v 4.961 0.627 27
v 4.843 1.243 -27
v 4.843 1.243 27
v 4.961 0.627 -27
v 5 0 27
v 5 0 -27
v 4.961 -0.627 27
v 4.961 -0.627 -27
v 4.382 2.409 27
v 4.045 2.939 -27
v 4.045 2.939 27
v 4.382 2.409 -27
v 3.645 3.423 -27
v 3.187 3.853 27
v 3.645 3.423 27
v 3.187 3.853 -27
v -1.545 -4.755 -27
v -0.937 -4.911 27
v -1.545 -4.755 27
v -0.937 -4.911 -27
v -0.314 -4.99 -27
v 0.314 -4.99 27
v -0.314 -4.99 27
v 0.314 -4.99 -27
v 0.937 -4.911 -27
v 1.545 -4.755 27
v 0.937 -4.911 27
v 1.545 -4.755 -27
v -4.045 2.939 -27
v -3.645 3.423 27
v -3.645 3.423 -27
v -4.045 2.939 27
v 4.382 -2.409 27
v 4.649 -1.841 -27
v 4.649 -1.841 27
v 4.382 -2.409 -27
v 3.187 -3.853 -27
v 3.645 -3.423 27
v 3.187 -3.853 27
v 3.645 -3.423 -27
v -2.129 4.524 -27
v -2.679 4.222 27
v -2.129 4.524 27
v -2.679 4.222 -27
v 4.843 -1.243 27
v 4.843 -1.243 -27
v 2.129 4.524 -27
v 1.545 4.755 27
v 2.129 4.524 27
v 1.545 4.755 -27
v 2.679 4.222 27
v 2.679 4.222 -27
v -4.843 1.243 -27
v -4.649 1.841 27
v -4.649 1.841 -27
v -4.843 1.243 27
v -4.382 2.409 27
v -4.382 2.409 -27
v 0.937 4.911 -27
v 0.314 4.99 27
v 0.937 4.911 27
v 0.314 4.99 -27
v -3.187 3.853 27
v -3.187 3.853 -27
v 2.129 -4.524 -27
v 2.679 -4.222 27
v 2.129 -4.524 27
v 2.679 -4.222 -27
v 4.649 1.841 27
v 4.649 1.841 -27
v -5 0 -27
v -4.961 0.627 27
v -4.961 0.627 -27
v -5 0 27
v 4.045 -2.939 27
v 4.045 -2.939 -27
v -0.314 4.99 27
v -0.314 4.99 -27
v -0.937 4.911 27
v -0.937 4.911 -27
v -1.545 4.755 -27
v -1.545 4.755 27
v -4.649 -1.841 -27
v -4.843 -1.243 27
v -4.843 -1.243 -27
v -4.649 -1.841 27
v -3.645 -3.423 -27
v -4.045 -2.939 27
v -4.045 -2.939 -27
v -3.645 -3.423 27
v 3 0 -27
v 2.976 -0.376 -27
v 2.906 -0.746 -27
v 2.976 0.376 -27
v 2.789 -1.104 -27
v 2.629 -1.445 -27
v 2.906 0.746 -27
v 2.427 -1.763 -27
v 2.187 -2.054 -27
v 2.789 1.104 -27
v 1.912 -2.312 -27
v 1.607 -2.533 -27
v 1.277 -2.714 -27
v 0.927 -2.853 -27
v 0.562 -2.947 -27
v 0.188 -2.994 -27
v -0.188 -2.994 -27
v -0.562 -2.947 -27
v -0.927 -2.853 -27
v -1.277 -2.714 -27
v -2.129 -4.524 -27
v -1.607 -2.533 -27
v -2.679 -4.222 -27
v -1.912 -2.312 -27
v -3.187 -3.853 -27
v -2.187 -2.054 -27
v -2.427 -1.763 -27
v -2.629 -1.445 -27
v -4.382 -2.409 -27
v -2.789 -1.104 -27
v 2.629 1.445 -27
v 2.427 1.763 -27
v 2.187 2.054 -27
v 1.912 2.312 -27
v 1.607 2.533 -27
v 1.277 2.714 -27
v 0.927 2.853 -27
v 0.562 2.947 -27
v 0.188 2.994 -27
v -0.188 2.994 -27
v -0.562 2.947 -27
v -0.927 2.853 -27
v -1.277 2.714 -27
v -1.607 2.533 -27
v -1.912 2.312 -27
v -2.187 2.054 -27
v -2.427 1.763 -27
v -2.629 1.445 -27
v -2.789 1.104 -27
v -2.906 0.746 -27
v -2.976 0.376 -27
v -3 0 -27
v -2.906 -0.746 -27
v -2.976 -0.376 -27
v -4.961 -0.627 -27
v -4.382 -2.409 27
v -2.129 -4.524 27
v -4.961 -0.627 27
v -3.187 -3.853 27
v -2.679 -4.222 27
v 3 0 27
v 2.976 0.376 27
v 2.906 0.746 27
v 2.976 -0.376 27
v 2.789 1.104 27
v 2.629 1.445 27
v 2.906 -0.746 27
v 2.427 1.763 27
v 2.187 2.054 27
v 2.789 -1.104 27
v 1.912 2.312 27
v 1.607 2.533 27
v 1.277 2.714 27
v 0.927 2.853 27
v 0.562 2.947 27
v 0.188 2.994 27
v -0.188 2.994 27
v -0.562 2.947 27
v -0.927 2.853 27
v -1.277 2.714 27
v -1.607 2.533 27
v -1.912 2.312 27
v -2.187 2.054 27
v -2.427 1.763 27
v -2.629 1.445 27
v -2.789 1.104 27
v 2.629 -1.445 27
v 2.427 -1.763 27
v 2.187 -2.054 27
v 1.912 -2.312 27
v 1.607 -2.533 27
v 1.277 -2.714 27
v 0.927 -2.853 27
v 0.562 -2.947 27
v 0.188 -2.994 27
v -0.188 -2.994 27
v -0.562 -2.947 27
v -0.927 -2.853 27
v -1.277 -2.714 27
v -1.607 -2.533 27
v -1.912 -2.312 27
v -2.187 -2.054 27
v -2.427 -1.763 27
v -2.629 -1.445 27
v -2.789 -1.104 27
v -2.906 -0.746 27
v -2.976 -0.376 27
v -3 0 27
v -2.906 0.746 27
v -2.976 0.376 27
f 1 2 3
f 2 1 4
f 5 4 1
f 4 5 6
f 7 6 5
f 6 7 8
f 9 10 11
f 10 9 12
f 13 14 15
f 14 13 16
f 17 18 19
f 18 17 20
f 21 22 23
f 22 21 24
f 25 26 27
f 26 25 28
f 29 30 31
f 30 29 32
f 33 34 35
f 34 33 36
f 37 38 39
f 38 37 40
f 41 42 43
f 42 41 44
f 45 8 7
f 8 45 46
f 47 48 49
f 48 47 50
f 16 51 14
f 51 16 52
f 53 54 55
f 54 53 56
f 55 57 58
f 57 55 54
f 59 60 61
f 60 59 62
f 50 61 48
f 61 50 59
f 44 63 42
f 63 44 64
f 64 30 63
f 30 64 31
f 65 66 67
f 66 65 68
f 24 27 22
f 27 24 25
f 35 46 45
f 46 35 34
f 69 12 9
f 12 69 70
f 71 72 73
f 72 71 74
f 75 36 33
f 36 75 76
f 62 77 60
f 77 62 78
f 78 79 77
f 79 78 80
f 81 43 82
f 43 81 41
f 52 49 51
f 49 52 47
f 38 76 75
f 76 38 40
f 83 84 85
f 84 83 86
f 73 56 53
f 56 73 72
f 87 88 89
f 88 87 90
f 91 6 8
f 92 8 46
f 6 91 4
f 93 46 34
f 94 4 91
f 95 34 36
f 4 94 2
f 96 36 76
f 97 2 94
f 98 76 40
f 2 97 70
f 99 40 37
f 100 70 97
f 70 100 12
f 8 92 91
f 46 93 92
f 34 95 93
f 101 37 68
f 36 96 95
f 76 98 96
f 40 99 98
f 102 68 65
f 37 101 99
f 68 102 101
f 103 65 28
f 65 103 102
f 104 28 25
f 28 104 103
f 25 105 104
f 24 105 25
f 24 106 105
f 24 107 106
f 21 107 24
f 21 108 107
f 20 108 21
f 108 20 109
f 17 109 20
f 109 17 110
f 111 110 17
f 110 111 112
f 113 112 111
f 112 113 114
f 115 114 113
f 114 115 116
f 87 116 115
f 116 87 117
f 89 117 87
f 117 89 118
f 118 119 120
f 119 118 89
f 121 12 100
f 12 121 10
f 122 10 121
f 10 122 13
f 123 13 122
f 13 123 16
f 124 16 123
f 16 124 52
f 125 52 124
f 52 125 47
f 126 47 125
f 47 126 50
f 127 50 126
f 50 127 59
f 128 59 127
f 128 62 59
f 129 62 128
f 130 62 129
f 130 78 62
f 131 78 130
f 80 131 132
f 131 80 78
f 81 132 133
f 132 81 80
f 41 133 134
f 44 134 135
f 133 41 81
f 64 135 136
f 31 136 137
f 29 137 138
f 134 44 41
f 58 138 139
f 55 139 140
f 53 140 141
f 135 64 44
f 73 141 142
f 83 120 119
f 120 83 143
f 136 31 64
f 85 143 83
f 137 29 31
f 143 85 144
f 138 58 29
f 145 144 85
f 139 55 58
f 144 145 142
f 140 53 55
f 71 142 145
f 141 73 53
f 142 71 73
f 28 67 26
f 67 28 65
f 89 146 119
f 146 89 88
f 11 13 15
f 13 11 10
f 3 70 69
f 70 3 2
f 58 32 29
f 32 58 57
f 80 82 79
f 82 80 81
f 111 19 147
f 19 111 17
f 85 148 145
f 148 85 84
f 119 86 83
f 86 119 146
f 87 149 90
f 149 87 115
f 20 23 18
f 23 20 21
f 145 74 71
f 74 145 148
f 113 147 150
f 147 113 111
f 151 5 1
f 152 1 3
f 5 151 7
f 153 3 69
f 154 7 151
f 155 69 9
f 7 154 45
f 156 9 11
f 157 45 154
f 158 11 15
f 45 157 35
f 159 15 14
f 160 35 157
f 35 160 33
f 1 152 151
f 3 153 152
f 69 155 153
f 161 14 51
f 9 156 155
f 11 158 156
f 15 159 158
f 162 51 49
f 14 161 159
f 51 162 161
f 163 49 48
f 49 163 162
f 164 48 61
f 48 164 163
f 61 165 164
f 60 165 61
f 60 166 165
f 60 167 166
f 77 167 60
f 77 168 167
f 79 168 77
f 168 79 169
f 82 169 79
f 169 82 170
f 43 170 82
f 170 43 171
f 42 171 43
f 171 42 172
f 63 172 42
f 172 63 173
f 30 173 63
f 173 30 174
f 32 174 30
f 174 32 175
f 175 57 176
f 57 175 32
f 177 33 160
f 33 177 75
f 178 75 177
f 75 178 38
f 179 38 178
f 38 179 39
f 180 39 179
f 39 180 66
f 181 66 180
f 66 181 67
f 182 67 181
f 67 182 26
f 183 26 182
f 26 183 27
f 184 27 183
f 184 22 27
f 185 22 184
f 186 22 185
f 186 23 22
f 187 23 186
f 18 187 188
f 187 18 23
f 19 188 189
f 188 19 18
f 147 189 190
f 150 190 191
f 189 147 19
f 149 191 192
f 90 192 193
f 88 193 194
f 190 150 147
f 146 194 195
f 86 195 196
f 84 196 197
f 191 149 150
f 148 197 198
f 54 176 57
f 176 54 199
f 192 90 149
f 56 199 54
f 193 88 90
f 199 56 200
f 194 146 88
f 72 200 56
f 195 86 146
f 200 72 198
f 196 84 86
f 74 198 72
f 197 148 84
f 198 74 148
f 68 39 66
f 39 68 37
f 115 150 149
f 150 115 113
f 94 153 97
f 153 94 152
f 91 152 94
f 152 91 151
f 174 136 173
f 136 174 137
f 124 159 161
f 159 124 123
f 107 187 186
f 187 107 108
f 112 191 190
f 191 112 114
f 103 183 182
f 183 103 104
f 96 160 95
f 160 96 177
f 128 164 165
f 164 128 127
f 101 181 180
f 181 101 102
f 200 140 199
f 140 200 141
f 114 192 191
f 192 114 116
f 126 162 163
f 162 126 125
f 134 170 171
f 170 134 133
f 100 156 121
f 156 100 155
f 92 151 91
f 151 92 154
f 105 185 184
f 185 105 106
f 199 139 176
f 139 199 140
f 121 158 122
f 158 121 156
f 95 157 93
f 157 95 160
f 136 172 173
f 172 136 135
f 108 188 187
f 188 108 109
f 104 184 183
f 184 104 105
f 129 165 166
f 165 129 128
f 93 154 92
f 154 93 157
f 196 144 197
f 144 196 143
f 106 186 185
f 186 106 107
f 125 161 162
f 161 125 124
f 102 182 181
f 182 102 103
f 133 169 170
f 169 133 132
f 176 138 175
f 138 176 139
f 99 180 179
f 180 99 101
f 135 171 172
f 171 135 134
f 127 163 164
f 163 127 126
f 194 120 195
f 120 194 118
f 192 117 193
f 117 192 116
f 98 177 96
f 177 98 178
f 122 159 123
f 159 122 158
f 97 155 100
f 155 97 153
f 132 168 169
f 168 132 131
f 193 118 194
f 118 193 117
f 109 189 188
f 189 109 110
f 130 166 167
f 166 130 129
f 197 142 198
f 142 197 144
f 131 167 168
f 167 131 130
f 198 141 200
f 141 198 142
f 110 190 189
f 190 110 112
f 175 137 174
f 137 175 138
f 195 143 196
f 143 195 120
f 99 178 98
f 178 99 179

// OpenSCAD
$fn = 50;


difference() {
	union() {
		translate(v = [0, 0, -27.0000000000]) {
			cylinder(h = 54, r = 5.0000000000);
		}
	}
	union() {
		translate(v = [0, 0, -100.0000000000]) {
			cylinder(h = 200, r = 3.0000000000);
		}
	}
}
